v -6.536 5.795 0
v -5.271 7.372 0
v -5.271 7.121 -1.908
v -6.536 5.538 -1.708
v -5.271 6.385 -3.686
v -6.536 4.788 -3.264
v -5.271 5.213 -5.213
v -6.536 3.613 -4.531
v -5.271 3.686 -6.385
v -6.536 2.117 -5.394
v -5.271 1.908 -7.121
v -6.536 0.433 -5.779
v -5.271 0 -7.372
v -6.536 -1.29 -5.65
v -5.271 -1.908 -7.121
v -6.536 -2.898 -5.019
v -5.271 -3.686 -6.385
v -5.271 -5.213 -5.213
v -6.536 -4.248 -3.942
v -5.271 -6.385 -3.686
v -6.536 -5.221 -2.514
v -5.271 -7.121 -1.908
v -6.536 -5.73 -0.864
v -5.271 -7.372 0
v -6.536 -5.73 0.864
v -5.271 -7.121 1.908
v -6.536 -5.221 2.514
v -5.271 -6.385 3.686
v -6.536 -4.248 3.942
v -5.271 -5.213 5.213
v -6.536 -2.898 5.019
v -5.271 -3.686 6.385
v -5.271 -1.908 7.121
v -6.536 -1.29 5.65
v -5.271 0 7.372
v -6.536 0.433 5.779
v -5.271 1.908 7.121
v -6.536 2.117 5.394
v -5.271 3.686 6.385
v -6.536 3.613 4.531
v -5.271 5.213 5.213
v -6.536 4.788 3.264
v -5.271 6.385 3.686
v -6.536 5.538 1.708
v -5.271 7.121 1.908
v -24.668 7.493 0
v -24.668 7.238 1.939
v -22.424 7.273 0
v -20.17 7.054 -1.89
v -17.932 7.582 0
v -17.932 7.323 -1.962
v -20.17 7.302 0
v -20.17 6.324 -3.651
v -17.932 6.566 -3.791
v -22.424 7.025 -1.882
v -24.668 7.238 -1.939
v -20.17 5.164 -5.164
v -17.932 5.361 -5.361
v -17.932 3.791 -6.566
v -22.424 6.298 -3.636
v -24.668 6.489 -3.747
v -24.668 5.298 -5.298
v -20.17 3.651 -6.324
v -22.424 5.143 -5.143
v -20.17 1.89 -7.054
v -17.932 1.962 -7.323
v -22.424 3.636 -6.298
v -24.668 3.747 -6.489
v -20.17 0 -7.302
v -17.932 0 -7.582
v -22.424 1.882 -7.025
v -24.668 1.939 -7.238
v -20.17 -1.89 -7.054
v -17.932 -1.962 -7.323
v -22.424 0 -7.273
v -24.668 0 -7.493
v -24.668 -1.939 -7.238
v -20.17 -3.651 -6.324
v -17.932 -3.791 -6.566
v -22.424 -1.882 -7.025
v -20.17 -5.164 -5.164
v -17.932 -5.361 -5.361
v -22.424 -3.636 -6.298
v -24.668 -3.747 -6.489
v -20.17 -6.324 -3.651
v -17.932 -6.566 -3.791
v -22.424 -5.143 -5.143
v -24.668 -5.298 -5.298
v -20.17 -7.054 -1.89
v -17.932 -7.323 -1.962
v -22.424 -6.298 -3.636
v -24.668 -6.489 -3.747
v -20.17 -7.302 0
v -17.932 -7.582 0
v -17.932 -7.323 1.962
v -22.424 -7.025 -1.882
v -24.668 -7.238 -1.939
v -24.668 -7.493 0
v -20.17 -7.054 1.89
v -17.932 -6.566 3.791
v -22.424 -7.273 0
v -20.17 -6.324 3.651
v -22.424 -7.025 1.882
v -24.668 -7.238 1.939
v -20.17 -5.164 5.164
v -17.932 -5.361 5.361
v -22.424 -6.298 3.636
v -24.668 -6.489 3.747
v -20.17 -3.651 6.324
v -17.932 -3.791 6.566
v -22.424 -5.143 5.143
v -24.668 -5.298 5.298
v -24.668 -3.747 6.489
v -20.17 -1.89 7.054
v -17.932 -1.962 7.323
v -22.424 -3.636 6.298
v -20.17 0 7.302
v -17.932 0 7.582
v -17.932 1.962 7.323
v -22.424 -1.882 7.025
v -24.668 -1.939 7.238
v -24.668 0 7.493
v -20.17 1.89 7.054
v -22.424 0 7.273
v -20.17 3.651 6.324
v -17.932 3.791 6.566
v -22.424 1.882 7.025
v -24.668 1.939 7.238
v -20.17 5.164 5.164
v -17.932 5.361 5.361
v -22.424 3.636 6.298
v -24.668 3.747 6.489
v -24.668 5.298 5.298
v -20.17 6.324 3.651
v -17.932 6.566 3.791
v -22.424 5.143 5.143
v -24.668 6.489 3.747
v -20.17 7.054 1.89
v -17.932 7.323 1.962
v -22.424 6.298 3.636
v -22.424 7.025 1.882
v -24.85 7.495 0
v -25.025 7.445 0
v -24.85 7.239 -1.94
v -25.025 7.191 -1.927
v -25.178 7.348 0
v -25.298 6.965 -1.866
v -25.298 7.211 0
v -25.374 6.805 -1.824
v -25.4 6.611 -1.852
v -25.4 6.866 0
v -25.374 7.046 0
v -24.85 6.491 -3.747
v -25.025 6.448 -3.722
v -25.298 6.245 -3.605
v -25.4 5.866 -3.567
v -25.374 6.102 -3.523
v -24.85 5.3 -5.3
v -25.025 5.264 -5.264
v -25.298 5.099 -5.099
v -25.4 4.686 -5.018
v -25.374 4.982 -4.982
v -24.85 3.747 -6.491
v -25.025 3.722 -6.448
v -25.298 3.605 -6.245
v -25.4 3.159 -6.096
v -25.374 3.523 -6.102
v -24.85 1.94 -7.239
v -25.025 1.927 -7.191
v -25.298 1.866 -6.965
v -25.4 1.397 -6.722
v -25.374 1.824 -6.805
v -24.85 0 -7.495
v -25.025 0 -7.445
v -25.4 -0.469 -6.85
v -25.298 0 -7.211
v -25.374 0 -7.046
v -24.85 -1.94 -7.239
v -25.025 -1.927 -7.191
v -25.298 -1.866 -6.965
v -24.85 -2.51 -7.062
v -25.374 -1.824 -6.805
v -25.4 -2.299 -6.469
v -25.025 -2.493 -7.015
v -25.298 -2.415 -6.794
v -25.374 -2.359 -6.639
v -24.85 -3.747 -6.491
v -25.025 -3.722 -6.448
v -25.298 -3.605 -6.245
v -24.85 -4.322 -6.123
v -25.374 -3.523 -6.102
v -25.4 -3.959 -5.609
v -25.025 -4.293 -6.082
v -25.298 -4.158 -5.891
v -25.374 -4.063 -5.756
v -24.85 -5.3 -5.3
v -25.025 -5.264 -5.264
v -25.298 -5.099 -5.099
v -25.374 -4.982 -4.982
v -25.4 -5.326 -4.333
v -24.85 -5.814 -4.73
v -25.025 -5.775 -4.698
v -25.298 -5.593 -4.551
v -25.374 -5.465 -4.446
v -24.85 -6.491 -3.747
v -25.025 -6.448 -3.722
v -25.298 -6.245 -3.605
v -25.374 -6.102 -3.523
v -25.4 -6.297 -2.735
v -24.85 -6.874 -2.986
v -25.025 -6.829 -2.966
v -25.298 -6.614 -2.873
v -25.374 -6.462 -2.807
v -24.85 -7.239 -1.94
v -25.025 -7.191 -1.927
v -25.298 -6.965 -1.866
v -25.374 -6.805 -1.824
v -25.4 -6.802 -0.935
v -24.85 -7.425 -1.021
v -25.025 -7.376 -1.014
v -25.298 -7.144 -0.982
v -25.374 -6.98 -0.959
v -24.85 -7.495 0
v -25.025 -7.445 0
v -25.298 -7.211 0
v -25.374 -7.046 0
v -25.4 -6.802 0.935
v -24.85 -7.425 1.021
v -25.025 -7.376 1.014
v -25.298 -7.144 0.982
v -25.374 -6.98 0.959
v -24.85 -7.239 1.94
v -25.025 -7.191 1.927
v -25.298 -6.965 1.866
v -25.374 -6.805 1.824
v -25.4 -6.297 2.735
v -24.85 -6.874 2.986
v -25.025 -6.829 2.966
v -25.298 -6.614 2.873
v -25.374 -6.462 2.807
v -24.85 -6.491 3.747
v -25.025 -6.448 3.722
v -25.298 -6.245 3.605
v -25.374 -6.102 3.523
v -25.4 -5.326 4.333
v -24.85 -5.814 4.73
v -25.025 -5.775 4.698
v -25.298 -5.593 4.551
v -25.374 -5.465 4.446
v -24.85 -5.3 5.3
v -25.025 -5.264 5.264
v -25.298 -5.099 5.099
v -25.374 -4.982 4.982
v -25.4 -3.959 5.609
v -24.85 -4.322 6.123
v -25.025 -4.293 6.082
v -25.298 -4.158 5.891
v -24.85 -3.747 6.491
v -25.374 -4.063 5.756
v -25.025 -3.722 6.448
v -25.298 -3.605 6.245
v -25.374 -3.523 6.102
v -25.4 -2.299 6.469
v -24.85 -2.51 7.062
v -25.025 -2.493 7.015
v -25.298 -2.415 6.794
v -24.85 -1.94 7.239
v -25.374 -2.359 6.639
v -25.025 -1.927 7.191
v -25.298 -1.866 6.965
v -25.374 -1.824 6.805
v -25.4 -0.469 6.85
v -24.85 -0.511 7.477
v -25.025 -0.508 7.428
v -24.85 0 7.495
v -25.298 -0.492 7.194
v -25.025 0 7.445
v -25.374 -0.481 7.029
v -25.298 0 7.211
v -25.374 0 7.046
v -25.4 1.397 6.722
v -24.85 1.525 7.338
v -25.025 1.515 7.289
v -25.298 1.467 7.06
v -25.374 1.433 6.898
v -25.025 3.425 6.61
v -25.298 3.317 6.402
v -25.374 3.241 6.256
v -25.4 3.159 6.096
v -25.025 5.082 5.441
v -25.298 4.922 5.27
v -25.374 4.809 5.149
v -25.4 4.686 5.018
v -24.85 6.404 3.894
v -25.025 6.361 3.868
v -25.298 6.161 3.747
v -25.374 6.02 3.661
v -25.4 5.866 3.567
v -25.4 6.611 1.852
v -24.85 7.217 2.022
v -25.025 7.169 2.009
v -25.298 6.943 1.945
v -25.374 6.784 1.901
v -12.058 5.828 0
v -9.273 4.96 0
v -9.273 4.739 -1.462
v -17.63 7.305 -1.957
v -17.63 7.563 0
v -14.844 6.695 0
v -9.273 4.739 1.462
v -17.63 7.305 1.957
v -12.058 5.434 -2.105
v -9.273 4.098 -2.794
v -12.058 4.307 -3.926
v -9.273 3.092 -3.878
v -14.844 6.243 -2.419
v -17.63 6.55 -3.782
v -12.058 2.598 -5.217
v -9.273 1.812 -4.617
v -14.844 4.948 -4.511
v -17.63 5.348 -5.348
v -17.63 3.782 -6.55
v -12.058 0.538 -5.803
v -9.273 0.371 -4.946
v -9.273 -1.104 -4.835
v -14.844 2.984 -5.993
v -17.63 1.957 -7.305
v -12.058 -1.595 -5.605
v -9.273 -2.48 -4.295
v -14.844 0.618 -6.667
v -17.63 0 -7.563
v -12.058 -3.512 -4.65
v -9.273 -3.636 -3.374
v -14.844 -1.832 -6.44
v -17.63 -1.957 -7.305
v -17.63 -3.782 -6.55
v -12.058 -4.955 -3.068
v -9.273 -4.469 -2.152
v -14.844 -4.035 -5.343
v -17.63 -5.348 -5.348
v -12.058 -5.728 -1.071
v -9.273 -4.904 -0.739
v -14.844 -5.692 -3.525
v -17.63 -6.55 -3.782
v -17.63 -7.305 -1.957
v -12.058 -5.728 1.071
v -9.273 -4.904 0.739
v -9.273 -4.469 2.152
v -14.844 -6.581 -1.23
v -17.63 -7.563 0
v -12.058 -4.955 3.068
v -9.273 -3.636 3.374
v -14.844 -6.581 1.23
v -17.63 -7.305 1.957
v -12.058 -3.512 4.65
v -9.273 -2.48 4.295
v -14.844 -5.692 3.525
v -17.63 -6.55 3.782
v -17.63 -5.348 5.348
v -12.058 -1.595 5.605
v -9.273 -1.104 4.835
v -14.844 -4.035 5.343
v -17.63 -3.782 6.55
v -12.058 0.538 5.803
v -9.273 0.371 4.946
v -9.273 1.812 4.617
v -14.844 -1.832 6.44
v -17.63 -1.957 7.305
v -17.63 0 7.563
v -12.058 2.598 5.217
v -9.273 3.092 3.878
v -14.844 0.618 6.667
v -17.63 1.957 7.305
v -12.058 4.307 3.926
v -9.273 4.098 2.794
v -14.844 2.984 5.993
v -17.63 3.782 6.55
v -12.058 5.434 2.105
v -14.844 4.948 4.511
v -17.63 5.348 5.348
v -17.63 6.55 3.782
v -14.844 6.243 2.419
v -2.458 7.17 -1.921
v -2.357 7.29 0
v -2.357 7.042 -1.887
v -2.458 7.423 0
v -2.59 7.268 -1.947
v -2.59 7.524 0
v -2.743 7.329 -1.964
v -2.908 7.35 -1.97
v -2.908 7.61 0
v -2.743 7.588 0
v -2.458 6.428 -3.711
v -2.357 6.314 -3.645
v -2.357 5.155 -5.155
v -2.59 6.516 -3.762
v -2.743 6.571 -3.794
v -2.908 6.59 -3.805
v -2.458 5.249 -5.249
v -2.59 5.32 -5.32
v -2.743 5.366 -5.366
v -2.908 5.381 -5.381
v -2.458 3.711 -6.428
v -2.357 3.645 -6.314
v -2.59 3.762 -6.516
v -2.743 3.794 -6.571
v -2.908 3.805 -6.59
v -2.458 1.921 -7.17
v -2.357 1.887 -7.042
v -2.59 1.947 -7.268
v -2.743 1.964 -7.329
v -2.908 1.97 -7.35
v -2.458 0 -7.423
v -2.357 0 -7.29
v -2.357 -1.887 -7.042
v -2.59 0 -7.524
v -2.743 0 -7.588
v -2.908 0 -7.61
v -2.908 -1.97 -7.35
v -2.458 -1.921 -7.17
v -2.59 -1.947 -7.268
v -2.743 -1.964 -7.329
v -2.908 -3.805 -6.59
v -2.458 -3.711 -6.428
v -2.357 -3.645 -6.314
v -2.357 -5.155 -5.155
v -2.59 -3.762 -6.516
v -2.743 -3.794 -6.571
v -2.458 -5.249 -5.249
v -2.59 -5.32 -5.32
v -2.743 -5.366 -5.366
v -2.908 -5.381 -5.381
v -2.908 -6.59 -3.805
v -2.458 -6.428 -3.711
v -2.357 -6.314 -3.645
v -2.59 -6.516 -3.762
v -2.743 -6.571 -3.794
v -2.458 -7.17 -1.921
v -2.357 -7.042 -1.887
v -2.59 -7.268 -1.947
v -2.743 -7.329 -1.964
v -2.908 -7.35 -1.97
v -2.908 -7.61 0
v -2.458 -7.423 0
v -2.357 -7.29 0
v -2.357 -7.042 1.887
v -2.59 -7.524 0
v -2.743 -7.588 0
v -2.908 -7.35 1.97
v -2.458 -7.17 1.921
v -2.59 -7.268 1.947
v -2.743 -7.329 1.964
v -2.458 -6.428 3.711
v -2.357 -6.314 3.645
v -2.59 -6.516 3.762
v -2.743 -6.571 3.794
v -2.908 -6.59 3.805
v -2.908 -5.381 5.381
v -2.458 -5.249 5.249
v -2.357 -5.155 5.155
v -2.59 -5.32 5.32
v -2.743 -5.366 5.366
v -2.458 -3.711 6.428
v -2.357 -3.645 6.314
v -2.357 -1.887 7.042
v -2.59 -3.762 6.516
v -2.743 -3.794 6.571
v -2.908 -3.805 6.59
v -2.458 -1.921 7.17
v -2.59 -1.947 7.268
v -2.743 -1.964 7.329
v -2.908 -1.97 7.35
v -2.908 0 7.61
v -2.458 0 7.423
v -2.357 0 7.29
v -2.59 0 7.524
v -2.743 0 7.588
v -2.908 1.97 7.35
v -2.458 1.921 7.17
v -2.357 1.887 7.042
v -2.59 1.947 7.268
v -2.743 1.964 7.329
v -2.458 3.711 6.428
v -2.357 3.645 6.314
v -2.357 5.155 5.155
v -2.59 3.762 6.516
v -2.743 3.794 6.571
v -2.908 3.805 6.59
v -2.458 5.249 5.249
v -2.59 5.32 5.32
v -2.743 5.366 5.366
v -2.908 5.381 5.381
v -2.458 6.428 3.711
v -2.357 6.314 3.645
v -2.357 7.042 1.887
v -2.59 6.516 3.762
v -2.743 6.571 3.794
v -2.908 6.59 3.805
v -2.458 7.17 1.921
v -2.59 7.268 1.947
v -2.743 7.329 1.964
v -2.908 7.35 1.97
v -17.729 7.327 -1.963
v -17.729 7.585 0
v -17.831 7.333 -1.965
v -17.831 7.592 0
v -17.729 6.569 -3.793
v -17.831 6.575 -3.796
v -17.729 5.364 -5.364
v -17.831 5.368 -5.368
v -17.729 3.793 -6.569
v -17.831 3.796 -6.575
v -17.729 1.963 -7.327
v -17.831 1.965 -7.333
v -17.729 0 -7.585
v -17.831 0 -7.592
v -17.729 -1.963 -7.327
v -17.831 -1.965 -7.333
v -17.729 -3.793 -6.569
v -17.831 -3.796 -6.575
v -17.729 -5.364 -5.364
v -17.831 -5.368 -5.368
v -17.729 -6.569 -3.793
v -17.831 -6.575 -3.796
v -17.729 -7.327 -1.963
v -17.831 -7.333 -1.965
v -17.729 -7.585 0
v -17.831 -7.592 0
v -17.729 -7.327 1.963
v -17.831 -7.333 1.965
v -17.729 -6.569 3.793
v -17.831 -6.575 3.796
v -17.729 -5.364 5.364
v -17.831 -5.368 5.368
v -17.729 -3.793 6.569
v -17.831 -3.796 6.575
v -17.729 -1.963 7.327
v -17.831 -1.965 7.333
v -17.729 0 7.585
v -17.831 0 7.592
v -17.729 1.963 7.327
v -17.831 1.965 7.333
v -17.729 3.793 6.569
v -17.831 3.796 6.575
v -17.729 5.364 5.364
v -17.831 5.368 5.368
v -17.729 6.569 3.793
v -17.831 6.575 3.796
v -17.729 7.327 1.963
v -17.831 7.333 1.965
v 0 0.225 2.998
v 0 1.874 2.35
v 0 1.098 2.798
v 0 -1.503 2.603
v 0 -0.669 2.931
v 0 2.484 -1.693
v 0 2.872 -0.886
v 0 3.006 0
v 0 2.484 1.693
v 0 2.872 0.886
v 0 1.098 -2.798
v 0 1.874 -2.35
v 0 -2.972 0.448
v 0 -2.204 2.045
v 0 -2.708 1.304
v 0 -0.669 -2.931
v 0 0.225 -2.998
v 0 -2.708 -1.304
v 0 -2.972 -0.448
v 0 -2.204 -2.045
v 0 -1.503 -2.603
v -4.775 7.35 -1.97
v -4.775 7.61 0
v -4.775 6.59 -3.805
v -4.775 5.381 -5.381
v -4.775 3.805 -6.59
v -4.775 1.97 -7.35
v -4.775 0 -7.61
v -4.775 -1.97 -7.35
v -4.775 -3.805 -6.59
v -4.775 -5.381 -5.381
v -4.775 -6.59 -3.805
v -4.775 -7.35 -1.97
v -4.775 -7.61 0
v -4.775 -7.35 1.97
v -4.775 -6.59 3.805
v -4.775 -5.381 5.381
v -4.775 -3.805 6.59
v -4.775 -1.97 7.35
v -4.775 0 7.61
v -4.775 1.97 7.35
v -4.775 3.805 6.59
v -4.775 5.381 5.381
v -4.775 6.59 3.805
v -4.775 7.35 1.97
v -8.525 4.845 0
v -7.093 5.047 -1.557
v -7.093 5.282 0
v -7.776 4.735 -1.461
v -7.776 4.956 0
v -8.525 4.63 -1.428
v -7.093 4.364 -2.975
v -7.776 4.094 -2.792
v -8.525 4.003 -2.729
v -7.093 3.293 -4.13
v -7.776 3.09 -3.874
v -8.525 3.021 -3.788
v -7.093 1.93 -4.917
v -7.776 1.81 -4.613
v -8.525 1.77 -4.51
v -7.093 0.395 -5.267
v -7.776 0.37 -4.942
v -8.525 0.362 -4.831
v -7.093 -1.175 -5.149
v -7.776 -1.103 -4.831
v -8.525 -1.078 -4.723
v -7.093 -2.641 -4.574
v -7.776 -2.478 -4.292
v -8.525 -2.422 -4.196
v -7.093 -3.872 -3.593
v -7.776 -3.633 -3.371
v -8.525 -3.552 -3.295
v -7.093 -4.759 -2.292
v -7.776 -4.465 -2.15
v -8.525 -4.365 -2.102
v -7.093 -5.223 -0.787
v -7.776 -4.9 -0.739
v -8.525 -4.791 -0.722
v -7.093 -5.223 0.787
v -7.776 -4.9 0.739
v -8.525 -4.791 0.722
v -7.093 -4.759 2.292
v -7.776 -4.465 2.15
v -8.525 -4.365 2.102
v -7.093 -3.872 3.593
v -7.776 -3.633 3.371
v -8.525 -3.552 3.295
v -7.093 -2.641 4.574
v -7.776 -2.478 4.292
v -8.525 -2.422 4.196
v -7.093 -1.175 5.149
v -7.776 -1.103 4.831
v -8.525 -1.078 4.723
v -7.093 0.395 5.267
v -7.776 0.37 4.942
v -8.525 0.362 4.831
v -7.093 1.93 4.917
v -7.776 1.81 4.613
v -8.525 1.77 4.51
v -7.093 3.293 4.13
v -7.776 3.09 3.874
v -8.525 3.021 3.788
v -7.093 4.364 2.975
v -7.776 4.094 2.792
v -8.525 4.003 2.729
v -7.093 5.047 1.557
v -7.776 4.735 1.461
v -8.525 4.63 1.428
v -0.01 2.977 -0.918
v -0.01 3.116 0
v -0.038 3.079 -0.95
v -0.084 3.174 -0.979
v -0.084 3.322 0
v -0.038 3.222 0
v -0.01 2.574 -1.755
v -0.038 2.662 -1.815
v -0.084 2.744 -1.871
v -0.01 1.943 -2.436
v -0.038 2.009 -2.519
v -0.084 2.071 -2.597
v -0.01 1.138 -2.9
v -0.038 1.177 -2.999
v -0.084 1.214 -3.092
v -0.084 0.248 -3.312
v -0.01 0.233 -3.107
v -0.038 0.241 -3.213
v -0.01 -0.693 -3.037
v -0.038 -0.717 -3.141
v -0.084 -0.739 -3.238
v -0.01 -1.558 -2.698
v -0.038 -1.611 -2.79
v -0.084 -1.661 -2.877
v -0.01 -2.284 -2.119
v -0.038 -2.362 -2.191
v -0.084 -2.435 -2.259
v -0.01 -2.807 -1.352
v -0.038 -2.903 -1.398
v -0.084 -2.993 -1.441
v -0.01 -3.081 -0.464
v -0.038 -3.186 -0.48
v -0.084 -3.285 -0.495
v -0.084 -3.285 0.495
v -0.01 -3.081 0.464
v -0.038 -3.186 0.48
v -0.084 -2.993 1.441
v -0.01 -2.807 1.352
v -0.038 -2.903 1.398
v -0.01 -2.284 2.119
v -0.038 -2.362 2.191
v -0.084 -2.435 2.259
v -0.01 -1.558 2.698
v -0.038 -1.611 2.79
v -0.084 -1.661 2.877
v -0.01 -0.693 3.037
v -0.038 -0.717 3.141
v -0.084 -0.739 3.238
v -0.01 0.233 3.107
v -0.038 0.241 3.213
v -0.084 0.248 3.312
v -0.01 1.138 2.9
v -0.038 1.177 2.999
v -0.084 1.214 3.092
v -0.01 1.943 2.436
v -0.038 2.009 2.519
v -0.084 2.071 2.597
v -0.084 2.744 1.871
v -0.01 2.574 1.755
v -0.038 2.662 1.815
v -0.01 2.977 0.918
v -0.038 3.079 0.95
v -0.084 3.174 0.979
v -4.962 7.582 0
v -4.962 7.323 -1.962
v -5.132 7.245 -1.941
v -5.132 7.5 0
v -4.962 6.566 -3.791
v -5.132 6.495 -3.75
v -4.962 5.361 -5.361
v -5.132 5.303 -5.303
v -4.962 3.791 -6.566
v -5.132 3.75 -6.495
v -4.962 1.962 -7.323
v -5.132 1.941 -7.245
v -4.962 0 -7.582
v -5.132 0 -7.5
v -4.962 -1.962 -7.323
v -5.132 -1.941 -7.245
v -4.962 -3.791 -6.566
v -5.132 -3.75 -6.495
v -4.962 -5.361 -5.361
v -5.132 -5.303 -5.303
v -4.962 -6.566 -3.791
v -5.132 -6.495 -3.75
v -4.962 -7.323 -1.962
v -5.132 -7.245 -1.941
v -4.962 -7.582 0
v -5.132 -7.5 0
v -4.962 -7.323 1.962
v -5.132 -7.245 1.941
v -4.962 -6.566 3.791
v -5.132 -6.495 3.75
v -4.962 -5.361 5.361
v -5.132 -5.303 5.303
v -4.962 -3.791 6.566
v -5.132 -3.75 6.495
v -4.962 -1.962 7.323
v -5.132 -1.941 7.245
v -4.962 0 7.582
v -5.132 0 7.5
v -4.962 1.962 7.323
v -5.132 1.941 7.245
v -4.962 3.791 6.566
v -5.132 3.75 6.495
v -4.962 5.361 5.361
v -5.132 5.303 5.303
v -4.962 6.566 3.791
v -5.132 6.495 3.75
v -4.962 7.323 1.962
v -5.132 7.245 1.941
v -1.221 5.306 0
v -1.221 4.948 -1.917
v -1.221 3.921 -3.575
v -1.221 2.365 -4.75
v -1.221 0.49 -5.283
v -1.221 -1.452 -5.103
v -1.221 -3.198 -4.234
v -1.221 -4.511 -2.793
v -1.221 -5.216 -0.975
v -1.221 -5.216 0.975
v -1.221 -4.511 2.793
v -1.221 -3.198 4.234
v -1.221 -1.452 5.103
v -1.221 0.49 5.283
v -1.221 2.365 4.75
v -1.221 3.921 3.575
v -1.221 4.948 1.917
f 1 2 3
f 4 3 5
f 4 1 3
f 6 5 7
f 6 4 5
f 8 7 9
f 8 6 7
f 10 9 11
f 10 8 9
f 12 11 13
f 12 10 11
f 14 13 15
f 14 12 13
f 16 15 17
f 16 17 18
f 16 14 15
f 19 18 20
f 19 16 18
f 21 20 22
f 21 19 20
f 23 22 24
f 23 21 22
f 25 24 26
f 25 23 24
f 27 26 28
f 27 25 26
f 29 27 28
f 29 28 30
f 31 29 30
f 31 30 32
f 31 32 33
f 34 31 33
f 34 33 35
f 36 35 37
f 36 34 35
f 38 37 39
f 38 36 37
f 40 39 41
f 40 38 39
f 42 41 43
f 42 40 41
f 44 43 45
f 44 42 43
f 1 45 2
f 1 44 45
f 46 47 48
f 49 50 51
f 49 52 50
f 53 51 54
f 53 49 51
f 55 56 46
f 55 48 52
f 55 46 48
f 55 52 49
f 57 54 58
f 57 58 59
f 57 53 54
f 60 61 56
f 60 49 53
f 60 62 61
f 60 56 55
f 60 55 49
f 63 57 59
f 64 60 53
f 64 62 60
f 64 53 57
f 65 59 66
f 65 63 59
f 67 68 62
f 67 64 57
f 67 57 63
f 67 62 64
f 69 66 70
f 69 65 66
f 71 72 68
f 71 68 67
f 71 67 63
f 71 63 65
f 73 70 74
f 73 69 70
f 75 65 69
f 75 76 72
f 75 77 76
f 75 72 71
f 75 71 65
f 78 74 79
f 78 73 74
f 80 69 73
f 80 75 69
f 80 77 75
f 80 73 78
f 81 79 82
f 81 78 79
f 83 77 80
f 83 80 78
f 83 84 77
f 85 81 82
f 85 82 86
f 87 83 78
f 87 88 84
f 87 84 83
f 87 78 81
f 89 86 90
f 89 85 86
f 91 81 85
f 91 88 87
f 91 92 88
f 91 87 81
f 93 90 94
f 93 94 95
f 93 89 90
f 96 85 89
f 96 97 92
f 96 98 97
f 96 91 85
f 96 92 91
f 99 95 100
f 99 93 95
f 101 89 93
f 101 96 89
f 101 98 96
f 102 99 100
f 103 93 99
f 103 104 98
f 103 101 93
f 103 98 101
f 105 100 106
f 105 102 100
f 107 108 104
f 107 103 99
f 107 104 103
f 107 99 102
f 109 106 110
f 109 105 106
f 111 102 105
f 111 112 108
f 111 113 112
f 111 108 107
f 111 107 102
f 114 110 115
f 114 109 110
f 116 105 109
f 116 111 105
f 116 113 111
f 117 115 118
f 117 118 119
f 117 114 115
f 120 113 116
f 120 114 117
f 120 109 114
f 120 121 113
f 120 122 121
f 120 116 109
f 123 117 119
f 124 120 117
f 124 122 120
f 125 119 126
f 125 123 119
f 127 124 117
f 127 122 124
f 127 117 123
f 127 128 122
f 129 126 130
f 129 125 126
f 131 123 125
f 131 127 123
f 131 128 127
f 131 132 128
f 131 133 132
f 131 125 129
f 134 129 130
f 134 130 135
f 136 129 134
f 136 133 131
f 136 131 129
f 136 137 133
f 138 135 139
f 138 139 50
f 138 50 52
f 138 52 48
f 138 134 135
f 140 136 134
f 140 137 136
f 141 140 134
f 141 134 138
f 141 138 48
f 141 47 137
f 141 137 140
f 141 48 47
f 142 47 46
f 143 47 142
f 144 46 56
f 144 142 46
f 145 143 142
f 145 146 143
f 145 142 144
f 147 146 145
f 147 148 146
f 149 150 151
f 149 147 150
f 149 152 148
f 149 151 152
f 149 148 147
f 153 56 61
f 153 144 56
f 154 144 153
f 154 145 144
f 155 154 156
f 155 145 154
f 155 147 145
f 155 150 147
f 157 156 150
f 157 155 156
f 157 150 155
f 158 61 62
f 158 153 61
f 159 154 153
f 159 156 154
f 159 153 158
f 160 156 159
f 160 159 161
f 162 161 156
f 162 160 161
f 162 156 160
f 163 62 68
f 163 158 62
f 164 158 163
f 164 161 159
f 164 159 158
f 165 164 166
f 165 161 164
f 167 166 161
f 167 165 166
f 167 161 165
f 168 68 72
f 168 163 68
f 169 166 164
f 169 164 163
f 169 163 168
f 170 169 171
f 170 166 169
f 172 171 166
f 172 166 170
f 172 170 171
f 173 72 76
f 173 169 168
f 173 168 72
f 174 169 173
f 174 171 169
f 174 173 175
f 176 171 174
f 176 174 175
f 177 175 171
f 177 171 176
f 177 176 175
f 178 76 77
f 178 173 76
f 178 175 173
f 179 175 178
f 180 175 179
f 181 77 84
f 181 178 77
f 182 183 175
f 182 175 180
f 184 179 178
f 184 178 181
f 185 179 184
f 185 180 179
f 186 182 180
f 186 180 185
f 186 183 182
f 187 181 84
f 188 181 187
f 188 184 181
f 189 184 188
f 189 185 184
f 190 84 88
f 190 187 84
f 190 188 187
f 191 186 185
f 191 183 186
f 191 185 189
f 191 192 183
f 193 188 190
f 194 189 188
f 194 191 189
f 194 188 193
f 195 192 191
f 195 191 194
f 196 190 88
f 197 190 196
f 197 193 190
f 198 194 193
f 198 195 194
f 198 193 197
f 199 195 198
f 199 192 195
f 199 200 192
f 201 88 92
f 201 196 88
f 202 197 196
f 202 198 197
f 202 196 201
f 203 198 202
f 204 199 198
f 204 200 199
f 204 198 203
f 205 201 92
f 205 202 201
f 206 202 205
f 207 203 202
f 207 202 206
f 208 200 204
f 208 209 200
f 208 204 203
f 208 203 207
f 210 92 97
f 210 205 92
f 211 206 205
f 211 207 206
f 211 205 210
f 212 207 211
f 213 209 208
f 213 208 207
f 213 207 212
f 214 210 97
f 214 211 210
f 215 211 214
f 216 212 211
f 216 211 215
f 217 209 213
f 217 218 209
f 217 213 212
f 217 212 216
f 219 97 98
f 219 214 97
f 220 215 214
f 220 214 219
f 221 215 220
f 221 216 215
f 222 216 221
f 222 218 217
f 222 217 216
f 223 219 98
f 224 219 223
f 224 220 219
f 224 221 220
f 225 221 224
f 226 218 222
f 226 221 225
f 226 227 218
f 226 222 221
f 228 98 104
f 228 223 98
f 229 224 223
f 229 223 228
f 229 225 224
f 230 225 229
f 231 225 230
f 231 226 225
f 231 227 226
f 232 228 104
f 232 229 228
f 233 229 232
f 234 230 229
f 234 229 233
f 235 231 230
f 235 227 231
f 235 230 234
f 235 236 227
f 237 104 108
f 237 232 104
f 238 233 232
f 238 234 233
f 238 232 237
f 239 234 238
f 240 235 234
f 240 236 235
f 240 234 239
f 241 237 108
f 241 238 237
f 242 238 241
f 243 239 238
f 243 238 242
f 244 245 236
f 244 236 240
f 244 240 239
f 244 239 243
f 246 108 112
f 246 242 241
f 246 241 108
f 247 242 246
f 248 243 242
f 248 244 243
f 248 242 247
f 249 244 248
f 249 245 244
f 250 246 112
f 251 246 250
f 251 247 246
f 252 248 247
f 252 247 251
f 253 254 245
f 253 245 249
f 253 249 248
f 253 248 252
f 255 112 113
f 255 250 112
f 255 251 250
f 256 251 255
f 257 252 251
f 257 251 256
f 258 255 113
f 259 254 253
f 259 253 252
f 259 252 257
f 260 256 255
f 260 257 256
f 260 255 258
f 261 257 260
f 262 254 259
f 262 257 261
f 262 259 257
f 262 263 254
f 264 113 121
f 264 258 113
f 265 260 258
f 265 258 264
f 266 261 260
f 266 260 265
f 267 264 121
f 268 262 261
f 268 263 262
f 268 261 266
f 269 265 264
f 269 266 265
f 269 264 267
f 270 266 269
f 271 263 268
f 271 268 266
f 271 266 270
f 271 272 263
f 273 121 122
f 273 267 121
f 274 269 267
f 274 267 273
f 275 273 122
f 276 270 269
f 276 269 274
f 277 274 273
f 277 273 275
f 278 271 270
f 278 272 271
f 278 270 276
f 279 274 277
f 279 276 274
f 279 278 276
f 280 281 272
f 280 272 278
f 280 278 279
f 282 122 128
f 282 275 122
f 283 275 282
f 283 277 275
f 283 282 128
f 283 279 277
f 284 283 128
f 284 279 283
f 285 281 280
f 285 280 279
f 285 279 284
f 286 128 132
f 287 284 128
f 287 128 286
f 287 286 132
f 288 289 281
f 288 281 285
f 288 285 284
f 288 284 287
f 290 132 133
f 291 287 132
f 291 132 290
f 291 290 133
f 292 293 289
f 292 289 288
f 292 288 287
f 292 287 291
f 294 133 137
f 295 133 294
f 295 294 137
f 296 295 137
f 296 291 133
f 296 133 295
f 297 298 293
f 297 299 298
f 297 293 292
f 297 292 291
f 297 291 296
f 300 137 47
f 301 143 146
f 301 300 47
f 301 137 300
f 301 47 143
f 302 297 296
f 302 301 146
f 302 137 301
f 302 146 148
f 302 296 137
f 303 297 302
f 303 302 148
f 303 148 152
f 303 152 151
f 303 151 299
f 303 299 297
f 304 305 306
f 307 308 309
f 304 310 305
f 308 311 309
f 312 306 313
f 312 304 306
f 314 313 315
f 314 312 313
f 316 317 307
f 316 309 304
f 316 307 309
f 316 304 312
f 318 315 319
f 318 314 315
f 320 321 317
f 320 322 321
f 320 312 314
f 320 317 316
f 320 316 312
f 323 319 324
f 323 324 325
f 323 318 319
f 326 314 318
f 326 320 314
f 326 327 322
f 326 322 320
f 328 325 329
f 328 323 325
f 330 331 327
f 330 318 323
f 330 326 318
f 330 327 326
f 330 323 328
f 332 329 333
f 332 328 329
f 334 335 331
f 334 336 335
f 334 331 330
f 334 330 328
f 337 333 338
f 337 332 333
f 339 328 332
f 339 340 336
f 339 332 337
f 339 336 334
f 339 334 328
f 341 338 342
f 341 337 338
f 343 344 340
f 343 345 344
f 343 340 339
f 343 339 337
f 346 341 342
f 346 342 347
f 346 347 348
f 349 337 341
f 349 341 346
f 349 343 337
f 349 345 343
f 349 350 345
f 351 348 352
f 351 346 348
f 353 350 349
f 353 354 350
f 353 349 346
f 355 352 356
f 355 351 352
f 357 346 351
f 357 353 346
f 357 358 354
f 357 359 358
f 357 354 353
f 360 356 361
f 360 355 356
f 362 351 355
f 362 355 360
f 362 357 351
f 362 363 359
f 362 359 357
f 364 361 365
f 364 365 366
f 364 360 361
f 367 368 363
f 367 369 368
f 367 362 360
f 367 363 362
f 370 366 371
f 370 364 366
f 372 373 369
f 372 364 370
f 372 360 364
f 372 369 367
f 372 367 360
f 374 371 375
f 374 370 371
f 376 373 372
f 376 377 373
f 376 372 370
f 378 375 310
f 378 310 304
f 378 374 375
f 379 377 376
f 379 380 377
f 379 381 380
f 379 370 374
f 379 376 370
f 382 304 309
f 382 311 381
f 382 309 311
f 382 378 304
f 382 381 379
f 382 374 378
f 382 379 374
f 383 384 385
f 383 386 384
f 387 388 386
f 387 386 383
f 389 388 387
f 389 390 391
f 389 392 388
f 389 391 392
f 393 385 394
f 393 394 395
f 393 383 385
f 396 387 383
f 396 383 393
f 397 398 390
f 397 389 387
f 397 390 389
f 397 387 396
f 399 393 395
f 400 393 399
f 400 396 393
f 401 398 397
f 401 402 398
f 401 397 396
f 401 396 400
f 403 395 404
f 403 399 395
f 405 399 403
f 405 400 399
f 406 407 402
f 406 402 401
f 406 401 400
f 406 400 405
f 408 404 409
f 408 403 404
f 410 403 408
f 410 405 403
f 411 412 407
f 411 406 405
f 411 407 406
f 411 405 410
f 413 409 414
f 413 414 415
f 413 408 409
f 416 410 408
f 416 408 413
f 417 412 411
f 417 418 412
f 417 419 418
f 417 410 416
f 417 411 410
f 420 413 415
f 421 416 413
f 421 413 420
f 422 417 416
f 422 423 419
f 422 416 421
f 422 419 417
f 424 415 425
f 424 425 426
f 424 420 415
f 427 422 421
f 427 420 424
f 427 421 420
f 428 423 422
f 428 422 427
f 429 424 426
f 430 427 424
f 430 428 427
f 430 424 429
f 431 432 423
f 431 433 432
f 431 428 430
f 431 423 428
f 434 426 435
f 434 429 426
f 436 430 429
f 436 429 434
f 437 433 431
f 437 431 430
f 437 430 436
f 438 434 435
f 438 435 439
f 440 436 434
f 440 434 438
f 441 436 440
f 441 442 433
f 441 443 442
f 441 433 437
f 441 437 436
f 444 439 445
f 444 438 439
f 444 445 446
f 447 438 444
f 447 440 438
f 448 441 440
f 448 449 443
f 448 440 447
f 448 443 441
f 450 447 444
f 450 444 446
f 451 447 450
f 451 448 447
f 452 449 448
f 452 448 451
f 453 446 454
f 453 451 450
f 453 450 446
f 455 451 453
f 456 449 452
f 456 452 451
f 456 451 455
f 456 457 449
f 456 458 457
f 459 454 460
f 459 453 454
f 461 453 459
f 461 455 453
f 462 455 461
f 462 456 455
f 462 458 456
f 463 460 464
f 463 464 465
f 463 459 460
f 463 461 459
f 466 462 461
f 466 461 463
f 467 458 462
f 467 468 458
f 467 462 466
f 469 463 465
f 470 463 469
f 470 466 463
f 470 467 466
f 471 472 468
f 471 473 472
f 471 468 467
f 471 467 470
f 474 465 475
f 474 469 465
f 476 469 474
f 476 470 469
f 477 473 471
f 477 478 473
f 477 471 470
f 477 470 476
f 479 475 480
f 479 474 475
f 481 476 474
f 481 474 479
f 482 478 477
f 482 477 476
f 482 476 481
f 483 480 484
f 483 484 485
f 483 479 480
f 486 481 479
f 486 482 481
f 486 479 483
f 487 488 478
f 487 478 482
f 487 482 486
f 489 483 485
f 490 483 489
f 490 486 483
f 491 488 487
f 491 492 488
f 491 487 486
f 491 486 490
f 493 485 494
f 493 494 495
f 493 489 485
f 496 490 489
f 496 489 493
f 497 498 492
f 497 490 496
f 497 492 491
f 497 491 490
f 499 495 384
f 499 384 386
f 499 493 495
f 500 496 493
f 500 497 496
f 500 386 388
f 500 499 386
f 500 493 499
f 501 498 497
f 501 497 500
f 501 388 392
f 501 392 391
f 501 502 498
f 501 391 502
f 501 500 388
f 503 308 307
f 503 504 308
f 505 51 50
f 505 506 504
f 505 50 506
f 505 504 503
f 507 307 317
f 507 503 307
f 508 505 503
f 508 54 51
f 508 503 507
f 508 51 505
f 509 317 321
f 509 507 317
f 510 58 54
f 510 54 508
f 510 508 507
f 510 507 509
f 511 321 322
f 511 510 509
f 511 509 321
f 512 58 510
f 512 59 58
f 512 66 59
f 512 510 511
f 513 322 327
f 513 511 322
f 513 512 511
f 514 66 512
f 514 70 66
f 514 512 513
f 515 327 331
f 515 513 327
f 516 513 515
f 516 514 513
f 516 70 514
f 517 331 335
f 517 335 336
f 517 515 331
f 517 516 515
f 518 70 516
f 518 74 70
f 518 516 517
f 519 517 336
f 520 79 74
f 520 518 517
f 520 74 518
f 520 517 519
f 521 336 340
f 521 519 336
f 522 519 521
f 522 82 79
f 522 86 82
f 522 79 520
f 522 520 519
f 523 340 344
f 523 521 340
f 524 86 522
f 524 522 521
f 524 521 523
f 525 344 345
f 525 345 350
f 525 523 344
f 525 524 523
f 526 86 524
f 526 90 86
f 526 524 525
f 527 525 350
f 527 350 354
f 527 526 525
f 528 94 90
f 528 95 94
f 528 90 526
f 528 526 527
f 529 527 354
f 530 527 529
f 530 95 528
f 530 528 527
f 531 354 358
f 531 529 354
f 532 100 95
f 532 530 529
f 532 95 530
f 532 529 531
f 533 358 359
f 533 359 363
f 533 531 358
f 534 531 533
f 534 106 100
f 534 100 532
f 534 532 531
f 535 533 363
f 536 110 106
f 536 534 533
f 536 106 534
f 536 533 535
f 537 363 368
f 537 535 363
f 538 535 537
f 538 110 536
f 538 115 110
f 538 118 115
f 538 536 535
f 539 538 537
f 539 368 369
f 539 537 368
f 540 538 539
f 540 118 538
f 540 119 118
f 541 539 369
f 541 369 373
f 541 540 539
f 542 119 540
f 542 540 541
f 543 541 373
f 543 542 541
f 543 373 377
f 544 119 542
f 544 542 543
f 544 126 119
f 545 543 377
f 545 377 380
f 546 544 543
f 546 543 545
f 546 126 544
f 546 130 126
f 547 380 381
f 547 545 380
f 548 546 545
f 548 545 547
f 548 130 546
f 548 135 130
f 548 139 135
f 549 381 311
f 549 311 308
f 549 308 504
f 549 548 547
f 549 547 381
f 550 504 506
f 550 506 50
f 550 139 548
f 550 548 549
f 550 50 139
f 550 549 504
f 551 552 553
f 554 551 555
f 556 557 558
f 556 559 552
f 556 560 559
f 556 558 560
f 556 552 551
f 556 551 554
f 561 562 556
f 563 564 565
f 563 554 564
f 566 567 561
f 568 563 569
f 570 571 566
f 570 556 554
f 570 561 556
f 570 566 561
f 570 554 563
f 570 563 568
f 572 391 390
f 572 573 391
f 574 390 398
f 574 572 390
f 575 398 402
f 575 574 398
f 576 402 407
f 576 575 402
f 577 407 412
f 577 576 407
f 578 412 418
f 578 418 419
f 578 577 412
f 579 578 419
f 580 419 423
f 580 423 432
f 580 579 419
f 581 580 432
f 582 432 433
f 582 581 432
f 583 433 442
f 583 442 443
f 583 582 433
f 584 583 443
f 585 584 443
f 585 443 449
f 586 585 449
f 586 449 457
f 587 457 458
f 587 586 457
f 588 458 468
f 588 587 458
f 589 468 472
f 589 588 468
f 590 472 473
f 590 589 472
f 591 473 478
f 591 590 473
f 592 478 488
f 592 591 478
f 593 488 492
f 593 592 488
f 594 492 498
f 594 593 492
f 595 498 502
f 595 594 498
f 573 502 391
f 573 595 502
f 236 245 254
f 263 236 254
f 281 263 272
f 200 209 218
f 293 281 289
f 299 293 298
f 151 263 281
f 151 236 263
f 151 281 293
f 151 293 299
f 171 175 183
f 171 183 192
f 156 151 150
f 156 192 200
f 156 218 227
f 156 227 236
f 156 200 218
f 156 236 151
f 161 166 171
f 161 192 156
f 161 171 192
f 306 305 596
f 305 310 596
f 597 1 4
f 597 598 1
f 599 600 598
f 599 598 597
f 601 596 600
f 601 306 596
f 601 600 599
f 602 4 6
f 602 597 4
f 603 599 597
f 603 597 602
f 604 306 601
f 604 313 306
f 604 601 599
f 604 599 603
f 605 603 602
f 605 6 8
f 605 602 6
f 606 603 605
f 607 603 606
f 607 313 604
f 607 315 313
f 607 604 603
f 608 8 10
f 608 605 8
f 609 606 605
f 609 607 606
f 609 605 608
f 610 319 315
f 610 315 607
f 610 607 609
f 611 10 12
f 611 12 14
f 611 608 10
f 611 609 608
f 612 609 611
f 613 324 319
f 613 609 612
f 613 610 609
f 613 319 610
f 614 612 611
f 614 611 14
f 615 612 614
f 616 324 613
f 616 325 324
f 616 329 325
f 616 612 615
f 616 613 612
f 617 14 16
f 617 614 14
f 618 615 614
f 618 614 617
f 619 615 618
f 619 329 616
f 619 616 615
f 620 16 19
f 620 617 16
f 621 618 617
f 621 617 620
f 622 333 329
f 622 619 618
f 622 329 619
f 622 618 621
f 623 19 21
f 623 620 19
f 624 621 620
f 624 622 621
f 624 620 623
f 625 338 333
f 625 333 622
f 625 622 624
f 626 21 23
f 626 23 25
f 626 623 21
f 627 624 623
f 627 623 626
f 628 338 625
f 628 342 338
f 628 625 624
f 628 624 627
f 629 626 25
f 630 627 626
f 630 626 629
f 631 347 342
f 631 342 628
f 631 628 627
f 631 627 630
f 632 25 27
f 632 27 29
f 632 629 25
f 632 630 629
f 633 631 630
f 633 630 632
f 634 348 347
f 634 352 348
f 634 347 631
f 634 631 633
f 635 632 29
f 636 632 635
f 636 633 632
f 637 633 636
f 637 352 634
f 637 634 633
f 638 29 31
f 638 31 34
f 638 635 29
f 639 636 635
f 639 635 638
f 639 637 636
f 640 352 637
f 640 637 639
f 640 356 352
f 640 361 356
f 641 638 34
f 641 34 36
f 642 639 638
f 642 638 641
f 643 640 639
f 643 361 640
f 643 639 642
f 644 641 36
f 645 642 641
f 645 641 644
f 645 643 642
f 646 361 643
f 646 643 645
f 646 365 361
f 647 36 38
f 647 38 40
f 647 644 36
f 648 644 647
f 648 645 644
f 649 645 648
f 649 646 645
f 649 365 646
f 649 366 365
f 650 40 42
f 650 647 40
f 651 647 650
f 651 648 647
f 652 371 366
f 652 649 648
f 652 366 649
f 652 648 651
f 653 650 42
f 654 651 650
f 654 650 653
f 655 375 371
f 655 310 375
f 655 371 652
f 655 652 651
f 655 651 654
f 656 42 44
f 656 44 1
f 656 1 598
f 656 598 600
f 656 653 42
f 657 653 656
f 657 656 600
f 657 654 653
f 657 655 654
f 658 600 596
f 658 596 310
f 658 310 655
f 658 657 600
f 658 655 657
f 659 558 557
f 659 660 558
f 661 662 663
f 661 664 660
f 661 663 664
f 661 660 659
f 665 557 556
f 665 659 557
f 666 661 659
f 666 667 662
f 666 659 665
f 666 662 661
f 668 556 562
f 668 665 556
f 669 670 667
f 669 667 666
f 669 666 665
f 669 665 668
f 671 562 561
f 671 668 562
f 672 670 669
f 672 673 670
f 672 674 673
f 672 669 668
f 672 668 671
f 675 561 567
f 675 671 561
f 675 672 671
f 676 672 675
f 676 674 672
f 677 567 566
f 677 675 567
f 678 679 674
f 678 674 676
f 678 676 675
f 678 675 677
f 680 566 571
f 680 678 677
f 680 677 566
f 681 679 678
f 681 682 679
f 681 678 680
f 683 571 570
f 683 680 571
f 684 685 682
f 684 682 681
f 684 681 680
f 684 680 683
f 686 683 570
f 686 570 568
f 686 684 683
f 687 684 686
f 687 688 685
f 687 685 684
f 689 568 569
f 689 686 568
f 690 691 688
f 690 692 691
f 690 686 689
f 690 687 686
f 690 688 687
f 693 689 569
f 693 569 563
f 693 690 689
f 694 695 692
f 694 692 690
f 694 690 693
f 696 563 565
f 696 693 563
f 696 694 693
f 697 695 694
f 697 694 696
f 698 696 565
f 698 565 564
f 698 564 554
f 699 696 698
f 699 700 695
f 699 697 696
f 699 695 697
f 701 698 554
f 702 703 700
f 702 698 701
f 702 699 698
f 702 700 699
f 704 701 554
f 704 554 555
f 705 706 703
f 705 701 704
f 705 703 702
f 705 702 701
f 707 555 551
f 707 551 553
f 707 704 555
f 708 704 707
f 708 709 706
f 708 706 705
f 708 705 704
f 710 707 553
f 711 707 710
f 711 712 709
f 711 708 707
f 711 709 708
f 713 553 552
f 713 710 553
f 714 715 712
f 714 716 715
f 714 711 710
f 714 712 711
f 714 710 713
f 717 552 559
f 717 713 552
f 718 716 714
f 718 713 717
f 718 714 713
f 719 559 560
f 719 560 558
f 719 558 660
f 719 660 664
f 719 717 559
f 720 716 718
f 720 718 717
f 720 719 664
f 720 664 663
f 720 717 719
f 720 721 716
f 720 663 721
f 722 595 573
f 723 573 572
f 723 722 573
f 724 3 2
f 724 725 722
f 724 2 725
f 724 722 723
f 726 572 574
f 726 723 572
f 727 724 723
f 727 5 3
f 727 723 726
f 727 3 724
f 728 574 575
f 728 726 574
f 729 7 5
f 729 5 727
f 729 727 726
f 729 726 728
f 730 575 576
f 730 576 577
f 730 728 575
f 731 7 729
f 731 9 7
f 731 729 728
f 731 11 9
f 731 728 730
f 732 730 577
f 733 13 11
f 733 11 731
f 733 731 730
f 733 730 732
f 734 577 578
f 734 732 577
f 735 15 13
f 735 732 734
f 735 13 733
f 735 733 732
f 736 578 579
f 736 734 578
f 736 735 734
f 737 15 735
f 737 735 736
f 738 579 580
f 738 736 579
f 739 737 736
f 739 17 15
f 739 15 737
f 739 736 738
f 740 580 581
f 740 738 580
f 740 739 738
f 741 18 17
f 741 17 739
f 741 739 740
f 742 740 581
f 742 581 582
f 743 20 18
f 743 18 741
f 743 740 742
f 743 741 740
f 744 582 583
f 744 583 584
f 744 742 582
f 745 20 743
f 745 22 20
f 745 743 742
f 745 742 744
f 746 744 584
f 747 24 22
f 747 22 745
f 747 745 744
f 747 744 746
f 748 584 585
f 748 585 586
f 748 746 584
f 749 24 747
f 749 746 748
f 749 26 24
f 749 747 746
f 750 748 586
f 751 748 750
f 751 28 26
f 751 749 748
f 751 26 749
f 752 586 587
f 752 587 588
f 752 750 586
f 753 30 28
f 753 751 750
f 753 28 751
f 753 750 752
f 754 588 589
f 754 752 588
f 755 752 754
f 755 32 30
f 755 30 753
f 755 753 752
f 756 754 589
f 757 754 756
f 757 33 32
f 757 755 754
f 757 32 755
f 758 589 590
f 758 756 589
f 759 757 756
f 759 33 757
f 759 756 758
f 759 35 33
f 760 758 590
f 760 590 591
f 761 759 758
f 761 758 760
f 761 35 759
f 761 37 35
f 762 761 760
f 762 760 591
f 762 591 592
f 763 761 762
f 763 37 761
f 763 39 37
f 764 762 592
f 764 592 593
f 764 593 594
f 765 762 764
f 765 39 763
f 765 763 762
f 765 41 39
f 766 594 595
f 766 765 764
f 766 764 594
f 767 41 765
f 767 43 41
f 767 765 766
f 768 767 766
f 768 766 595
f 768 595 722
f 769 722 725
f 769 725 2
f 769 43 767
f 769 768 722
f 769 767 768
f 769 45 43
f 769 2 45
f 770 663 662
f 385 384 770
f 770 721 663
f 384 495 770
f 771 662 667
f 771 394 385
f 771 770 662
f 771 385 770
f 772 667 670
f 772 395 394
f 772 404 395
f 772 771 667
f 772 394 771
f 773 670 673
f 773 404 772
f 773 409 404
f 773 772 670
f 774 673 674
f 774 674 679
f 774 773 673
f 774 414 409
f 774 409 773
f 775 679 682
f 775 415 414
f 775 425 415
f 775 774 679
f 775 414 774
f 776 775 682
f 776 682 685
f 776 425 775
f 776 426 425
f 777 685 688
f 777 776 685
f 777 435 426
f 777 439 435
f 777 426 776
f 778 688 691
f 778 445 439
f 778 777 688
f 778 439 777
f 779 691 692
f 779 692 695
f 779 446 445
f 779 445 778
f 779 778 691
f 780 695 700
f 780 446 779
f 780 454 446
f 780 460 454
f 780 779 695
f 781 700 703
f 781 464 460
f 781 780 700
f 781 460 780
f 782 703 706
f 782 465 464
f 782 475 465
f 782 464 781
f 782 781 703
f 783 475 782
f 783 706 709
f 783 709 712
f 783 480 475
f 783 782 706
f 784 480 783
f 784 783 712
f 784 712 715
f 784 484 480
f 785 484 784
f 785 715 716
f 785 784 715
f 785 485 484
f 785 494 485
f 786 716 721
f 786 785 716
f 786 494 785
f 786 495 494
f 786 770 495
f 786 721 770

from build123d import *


with BuildPart() as f1:
    # F0 (on Top) → F1 (revolve)
    with BuildSketch(Plane.XY):
        with BuildLine():
            Line((-25.4, 0), (0, 0))
            Line((0, 0), (0, 3.006029))
            ThreePointArc((0, 3.006029), (-0.021354, 3.169318), (-0.083979, 3.321625))
            Line((-0.083979, 3.321625), (-2.357062, 7.290364))
            ThreePointArc((-2.357062, 7.290364), (-2.589633, 7.524145), (-2.908083, 7.609769))
            Line((-2.908083, 7.609769), (-4.775419, 7.609769))
            ThreePointArc((-4.775419, 7.609769), (-5.050043, 7.547313), (-5.270645, 7.37223))
            Line((-5.270645, 7.37223), (-6.536468, 5.795051))
            ThreePointArc((-6.536468, 5.795051), (-7.77584, 4.955551), (-9.272766, 4.959825))
            Line((-9.272766, 4.959825), (-17.629906, 7.563013))
            ThreePointArc((-17.629906, 7.563013), (-17.779944, 7.590558), (-17.932223, 7.581525))
            ThreePointArc((-17.932223, 7.581525), (-21.296409, 7.256235), (-24.667976, 7.493079))
            ThreePointArc((-24.667976, 7.493079), (-25.178288, 7.347632), (-25.4, 6.865535))
            Line((-25.4, 6.865535), (-25.4, 0))
        make_face()
    revolve(axis=Axis((-12.7, 0, 0), (-1, 0, 0)))


solid = f1.part
